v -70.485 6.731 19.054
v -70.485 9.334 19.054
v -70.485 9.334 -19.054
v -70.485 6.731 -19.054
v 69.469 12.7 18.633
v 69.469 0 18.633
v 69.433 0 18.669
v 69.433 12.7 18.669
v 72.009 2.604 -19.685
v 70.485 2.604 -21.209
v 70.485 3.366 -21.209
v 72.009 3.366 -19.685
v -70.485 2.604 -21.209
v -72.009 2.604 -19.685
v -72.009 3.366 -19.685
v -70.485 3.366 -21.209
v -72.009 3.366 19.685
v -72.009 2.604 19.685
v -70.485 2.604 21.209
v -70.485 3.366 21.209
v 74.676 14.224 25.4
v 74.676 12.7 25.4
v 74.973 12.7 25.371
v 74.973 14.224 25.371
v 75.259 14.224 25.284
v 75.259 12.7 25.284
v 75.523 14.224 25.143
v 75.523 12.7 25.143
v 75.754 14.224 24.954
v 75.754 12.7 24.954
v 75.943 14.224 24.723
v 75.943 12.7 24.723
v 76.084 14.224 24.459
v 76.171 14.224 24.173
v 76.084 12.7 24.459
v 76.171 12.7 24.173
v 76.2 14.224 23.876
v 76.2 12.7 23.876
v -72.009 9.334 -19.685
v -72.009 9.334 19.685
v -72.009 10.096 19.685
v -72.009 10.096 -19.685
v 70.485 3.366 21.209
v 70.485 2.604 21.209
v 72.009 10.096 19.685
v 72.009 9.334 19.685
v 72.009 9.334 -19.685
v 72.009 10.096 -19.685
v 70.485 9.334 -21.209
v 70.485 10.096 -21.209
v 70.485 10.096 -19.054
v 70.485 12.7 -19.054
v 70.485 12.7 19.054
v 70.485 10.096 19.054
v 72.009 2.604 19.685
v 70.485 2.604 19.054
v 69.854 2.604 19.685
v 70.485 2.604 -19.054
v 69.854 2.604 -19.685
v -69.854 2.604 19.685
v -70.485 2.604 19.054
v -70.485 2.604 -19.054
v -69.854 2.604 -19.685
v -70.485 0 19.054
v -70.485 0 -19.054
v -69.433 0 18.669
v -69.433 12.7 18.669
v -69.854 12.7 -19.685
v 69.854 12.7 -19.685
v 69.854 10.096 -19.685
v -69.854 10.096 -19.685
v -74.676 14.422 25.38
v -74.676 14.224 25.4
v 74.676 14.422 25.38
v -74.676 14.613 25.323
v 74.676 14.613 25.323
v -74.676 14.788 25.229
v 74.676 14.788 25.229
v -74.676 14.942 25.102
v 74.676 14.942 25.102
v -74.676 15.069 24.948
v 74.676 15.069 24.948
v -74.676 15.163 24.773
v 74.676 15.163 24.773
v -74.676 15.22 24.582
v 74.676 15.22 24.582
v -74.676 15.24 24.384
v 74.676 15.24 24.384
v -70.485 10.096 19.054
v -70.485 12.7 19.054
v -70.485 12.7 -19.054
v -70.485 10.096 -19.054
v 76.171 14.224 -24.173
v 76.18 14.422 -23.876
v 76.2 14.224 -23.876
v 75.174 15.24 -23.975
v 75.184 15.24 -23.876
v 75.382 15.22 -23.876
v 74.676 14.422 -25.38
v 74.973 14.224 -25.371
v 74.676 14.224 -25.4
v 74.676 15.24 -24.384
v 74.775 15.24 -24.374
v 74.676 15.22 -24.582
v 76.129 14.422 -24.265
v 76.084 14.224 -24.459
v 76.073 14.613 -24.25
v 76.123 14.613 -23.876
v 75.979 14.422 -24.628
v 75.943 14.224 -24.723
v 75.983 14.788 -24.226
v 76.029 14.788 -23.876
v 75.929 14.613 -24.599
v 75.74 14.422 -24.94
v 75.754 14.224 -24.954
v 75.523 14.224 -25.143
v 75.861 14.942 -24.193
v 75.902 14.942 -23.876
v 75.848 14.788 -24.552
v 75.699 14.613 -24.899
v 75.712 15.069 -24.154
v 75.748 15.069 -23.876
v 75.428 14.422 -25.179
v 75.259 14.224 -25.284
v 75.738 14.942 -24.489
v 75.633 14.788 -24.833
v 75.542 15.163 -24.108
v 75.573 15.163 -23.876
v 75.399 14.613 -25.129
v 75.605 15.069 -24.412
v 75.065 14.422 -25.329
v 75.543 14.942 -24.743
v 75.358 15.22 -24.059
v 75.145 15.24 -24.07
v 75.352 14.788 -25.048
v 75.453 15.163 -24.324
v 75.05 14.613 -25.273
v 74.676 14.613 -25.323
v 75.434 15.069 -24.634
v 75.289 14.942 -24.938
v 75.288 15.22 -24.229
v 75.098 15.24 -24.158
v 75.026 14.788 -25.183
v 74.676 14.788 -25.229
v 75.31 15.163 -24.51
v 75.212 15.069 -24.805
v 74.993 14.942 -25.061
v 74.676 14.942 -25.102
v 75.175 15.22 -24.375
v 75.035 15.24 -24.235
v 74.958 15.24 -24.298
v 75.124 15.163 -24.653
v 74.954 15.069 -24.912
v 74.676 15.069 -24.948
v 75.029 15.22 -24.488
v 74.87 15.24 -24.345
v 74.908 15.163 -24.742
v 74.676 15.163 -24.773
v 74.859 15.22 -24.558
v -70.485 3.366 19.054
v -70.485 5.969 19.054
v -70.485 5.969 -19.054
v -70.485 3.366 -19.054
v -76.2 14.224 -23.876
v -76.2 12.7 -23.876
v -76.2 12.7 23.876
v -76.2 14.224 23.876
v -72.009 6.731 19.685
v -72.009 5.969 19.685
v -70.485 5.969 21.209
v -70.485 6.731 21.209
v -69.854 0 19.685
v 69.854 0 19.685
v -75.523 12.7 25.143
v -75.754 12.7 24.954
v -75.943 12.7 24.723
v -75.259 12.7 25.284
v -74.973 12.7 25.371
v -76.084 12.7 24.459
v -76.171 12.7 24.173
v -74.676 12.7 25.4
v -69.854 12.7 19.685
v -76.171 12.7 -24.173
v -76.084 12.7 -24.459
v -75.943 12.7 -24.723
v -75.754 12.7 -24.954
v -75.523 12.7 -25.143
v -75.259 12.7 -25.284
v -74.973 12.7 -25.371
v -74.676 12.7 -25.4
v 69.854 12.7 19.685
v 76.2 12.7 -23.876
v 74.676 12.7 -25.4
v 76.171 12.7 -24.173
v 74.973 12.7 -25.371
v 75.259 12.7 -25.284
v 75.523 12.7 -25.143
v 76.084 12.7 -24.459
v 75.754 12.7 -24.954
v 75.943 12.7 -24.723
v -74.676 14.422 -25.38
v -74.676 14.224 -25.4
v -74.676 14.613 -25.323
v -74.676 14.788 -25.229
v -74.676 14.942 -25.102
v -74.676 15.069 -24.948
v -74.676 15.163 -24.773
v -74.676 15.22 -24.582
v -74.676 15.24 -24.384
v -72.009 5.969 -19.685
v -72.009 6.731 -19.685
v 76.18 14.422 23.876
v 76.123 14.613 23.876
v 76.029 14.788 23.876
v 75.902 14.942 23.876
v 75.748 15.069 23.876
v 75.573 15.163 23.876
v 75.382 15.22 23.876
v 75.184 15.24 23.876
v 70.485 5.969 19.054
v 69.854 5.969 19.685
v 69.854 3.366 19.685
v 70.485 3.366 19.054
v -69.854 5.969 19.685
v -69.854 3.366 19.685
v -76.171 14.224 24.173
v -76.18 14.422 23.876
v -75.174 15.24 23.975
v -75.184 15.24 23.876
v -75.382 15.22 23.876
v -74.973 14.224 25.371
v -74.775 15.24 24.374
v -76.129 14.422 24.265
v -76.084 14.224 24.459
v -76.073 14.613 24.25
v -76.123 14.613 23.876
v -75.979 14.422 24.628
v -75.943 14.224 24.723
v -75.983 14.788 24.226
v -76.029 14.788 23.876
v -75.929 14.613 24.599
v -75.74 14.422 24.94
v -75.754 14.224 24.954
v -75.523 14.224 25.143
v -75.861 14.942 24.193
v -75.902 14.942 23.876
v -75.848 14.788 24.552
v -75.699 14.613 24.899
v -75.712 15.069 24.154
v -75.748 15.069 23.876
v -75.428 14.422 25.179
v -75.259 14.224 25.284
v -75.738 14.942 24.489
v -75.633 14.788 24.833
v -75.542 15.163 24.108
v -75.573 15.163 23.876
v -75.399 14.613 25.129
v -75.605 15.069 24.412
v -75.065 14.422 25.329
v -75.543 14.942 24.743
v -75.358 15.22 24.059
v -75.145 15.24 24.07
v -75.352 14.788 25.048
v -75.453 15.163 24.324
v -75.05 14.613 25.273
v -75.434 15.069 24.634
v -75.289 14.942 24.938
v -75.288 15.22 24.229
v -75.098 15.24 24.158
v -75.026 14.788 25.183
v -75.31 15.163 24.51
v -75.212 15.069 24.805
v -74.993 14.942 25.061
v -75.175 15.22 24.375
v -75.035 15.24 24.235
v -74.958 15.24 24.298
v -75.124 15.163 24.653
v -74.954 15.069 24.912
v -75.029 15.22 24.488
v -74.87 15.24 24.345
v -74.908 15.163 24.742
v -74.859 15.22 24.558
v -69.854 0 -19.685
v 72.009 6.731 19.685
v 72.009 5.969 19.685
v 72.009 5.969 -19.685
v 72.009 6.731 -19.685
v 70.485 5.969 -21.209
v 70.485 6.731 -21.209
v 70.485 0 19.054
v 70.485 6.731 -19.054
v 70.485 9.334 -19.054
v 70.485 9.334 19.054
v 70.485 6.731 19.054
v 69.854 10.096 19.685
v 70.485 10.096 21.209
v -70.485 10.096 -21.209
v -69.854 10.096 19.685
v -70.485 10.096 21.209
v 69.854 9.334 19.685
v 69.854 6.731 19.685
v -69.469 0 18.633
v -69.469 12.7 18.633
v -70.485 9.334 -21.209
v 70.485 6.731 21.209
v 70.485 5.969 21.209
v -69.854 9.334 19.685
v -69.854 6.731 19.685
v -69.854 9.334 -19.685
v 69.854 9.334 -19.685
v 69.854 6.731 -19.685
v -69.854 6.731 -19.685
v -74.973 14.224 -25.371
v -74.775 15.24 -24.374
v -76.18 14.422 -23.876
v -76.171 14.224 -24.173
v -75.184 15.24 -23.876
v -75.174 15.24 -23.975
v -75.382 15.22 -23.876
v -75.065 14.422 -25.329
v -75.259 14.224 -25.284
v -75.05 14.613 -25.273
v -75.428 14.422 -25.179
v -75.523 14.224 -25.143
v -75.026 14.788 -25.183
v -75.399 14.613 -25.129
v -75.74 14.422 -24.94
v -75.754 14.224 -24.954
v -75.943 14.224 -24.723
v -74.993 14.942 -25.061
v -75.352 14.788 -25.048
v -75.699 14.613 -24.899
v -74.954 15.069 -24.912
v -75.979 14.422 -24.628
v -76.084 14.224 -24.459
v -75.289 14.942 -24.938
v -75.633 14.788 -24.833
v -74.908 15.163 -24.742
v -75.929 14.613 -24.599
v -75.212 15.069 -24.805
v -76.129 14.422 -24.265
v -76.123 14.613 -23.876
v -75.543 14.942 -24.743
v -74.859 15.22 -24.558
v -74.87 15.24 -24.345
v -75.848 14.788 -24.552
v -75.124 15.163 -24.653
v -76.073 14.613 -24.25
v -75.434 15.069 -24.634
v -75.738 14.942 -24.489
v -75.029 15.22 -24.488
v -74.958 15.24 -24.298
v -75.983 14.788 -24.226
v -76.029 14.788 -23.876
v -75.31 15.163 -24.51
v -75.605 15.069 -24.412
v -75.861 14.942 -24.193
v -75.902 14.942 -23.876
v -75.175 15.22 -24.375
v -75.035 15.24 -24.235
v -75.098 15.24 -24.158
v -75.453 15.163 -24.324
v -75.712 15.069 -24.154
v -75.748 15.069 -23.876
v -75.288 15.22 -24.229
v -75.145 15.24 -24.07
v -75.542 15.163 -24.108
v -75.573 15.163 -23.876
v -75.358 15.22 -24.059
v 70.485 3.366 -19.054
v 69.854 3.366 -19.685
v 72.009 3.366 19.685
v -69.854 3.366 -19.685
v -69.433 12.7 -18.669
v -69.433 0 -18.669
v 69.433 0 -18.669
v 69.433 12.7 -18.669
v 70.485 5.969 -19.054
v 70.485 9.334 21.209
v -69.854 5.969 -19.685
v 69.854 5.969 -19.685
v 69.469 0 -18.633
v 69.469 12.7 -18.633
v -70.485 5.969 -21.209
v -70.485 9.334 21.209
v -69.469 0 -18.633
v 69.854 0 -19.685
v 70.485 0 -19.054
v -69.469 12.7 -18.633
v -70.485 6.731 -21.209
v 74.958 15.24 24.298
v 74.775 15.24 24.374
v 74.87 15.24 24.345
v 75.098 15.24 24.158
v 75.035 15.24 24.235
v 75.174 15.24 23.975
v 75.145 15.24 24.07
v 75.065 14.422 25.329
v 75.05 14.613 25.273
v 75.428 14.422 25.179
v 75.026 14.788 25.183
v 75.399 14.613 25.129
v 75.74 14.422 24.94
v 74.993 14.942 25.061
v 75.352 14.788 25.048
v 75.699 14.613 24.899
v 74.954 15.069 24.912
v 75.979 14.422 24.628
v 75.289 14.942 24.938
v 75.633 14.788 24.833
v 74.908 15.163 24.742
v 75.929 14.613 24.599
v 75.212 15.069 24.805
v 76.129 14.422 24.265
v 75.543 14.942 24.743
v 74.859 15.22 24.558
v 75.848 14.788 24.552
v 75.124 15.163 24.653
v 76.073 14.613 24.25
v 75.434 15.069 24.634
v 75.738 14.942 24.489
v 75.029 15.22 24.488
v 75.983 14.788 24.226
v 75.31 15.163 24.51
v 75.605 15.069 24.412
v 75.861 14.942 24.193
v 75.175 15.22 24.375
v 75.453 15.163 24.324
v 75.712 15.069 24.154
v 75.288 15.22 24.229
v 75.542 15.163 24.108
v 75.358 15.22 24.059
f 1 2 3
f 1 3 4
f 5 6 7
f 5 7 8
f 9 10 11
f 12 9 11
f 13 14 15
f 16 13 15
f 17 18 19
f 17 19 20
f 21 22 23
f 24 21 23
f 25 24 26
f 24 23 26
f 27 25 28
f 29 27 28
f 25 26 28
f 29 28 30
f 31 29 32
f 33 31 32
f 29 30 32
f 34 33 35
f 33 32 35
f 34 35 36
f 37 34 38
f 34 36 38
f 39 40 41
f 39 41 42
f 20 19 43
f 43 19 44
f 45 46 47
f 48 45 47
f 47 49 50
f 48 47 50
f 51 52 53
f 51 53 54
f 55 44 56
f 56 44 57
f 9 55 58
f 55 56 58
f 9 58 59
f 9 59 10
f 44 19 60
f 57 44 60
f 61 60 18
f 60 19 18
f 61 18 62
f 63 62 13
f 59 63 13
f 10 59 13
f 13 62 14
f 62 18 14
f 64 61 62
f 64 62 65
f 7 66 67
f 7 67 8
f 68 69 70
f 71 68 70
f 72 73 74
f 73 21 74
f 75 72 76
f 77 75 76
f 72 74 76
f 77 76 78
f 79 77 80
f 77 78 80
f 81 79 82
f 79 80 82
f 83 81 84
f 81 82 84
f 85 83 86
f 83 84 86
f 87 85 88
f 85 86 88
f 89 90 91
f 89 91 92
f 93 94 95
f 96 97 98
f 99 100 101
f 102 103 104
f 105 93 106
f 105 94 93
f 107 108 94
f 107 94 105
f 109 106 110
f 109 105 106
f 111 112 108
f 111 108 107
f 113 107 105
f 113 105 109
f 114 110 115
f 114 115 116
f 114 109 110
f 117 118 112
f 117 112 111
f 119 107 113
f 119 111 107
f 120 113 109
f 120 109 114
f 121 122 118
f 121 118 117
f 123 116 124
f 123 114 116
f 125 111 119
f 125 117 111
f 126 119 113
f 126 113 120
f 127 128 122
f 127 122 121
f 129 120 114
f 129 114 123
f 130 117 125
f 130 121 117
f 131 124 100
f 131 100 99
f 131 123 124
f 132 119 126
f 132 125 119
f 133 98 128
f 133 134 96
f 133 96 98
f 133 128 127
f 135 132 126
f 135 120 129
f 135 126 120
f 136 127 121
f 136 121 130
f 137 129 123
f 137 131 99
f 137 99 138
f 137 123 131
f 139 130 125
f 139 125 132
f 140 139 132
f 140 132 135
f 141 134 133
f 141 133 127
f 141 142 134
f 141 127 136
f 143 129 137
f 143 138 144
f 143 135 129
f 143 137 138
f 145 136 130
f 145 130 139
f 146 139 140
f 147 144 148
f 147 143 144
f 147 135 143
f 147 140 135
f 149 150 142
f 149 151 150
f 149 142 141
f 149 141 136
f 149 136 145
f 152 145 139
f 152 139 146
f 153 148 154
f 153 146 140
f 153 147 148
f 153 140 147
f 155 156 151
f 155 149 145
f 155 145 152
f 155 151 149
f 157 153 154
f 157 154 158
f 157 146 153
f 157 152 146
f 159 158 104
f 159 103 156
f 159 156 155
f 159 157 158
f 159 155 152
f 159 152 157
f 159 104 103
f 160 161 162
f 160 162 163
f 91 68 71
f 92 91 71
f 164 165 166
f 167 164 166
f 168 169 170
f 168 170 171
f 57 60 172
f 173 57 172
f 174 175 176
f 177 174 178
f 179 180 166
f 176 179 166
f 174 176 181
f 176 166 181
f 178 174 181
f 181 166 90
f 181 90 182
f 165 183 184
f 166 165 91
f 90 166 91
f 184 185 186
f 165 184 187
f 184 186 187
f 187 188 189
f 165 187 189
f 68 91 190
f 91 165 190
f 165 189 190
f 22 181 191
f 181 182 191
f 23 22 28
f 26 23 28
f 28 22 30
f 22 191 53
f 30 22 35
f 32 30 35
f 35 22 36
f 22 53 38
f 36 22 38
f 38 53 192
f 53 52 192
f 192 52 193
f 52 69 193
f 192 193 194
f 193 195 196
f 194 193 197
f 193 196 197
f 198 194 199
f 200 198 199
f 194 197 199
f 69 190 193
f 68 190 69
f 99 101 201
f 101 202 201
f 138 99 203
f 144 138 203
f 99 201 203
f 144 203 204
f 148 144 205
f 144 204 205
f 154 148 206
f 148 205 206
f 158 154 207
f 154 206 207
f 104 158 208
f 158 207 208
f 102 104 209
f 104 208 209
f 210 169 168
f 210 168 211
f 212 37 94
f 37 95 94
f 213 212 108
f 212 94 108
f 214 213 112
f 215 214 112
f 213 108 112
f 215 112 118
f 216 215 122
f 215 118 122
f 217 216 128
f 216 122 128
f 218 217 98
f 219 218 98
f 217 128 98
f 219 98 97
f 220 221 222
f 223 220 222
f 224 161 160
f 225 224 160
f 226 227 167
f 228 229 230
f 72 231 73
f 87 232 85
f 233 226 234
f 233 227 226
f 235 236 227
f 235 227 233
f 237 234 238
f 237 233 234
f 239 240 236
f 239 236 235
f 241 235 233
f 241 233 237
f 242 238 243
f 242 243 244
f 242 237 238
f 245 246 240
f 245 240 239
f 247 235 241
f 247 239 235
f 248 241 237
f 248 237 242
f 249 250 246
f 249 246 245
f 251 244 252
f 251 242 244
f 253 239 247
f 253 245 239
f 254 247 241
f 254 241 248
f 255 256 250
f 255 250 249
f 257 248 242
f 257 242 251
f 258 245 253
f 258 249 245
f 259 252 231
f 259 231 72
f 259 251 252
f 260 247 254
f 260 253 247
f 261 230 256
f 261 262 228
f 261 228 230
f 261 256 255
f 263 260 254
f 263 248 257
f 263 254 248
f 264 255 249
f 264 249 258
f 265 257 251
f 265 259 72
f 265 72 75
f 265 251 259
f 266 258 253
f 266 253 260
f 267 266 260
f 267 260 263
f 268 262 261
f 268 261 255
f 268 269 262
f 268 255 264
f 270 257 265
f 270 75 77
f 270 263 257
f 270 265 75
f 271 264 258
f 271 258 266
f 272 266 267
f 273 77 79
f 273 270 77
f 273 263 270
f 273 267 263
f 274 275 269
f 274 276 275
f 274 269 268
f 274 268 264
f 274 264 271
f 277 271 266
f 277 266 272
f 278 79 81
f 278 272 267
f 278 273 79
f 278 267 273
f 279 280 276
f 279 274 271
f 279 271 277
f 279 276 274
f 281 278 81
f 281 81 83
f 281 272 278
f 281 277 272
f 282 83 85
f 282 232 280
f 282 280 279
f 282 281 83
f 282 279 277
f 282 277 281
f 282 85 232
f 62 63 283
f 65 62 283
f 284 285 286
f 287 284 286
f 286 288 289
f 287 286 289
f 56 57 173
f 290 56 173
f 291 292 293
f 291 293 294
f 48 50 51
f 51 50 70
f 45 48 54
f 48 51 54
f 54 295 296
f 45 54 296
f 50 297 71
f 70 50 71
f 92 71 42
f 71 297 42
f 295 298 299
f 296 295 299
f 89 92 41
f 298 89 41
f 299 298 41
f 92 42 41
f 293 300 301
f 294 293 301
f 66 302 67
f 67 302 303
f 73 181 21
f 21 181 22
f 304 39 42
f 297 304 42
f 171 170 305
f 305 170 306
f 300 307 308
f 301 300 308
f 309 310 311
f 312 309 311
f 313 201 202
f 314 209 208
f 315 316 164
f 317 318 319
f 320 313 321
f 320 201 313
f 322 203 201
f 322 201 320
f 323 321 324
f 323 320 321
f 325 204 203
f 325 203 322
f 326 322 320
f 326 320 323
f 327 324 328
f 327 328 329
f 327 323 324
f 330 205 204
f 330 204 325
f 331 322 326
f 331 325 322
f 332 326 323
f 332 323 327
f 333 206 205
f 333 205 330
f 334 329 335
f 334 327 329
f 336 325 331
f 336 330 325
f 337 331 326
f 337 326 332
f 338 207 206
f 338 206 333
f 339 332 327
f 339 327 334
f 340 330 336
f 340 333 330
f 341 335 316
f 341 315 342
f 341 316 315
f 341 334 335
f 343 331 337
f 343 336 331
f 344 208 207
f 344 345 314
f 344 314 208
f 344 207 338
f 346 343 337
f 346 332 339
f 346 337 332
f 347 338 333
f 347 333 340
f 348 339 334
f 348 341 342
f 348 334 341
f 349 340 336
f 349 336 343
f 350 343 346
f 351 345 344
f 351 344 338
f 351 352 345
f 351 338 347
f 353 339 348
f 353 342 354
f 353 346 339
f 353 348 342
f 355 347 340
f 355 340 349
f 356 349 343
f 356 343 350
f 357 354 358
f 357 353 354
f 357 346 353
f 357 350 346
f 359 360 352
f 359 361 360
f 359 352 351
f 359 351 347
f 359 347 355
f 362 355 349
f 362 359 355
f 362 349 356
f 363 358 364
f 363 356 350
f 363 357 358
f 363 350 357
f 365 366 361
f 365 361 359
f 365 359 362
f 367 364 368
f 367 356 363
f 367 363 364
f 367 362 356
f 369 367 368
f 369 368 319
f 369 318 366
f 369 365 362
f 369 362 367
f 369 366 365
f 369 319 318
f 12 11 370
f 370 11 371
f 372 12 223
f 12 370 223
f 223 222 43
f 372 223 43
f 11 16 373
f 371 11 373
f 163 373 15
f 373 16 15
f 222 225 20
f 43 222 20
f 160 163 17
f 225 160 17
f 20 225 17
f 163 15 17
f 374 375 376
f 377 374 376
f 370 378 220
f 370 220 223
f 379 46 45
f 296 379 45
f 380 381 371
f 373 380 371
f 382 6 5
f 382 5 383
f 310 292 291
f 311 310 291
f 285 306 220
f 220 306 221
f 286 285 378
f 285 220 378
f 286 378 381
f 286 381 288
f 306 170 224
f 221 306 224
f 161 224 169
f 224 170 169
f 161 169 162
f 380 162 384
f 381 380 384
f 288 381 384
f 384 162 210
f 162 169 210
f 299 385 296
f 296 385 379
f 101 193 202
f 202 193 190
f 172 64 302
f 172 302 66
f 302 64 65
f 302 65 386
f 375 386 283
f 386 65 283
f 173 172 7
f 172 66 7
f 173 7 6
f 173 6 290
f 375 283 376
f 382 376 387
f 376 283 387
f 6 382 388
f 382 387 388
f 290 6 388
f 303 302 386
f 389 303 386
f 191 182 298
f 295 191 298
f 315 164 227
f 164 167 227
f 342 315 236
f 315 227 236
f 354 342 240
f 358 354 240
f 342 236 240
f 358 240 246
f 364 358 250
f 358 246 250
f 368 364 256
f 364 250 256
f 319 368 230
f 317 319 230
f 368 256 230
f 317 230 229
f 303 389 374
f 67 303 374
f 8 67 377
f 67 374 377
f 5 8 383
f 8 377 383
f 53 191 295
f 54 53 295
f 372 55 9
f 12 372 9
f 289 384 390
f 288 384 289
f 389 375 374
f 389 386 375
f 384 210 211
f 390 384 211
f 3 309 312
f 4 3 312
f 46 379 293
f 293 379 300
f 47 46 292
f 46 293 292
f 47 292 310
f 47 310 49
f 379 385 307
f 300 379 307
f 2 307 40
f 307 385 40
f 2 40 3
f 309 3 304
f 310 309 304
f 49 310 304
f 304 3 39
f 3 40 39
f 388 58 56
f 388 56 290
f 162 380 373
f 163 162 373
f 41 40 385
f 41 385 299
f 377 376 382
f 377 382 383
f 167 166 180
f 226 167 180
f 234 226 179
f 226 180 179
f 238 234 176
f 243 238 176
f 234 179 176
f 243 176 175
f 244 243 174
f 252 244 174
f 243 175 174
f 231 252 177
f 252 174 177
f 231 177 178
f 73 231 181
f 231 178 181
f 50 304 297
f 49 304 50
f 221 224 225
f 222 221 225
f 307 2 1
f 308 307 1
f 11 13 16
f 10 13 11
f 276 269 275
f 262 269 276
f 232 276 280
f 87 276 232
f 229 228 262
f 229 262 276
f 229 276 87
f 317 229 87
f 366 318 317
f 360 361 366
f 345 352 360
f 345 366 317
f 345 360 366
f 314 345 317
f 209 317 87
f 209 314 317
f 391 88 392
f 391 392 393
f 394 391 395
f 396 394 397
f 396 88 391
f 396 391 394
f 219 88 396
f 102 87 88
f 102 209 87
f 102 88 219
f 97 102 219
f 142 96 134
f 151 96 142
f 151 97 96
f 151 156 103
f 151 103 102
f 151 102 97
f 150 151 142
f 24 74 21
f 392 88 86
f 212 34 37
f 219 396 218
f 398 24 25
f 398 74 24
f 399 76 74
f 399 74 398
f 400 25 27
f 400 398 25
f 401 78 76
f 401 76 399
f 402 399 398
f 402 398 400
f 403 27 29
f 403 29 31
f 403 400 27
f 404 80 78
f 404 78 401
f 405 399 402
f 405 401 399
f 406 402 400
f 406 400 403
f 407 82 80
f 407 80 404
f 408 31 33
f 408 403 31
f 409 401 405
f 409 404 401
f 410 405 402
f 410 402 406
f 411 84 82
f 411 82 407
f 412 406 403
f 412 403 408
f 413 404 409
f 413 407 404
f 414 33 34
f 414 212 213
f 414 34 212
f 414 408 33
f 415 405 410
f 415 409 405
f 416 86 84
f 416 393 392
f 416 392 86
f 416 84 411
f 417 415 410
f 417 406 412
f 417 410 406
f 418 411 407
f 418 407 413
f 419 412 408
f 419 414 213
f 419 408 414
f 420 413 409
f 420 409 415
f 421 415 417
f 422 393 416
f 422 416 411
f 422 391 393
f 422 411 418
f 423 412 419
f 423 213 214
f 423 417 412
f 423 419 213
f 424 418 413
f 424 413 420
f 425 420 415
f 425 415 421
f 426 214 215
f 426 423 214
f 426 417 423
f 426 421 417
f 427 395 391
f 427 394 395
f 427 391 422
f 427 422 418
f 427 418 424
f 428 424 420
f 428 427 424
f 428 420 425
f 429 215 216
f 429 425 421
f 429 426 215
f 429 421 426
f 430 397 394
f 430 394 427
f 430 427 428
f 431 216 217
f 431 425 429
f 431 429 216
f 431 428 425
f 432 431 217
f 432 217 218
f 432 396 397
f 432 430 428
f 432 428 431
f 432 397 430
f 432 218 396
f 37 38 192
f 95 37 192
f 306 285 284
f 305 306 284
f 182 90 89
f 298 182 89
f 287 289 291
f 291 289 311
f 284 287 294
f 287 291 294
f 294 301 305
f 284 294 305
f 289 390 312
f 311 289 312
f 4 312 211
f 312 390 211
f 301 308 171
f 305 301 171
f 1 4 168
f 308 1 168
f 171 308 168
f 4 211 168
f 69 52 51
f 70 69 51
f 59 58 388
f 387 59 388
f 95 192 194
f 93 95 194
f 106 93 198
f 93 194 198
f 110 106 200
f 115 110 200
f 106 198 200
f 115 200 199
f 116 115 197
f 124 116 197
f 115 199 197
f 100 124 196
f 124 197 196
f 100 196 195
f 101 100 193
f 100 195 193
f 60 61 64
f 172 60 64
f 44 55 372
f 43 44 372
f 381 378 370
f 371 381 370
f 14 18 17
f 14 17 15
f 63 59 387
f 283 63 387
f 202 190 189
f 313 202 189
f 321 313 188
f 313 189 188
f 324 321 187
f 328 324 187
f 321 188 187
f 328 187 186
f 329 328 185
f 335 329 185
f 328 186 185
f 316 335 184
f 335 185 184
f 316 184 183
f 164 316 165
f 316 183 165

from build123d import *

# Parameters (mm, degrees)
SKETCH1_W           = 144.018
SKETCH1_H           = 42.418
BOSS_EXTRUDE1_DEPTH = 12.7
BOSS_EXTRUDE2_DEPTH = 2.54
CHAMFER1_SIZE       = 1.524
SHELL1_T            = -2.54
SKETCH4_W           = 1.524
SKETCH4_H           = 2.6035
FILLET2_R           = 1.016


with BuildPart() as part:
    # Sketch1 → Boss-Extrude1 (new body)
    with BuildSketch(Plane(origin=(0, 0, 0), x_dir=(1, 0, 0), z_dir=(0, 1, 0))):
        Rectangle(SKETCH1_W, SKETCH1_H)
    extrude(amount=BOSS_EXTRUDE1_DEPTH)

    # Sketch2 → Boss-Extrude2 (add)
    with BuildSketch(Plane(origin=(0, 12.7, 0), x_dir=(1, 0, 0), z_dir=(0, 1, 0))):
        with BuildLine():
            Line((-76.2, 23.876), (-76.2, -23.876))
            ThreePointArc((-76.2, -23.876), (-75.753630735, -24.953630735), (-74.676, -25.4))
            Line((-74.676, -25.4), (74.676, -25.4))
            ThreePointArc((74.676, -25.4), (75.753630735, -24.953630735), (76.2, -23.876))
            Line((76.2, -23.876), (76.2, 23.876))
            ThreePointArc((76.2, 23.876), (75.753630735, 24.953630735), (74.676, 25.4))
            Line((74.676, 25.4), (-74.676, 25.4))
            ThreePointArc((-74.676, 25.4), (-75.753630735, 24.953630735), (-76.2, 23.876))
        make_face()
    extrude(amount=BOSS_EXTRUDE2_DEPTH)

    # Chamfer1
    chamfer1_edges = [part.edges().sort_by_distance(p)[0] for p in [
        (72.009, 6.35, 21.209),
        (-72.009, 6.35, 21.209),
        (-72.009, 6.35, -21.209),
        (72.009, 6.35, -21.209),
    ]]
    chamfer(chamfer1_edges, length=CHAMFER1_SIZE)

    # Shell1
    shell1_openings = [part.faces().sort_by_distance(p)[0] for p in [
        (0, 0, 0),
    ]]
    offset(amount=SHELL1_T, openings=shell1_openings, kind=Kind.INTERSECTION)

    # Cut-Sweep2: sweep along a path in Sketch3
    with BuildLine(Plane(origin=(0, 0, 0), x_dir=(-1, 0, 0), z_dir=(0, -1, 0))) as cut_sweep2_path:
        Line((-72.009, 19.685), (-72.009, -19.685))
        Line((-72.009, -19.685), (-70.485, -21.209))
        Line((-70.485, -21.209), (70.485, -21.209))
        Line((70.485, -21.209), (72.009, -19.685))
        Line((72.009, -19.685), (72.009, 19.685))
        Line((72.009, 19.685), (70.485, 21.209))
        Line((70.485, 21.209), (-70.485, 21.209))
        Line((-70.485, 21.209), (-72.009, 19.685))
    # Sketch4 → Cut-Sweep2 (sweep, cut)
    with BuildSketch(Plane.XY):
        with Locations((71.247, 1.30175)):
            Rectangle(SKETCH4_W, SKETCH4_H)
        with Locations((71.247, 8.03275)):
            Rectangle(SKETCH4_W, SKETCH4_H)
        with Locations((71.247, 11.39825)):
            Rectangle(SKETCH4_W, SKETCH4_H)
        with Locations((71.247, 4.66725)):
            Rectangle(SKETCH4_W, SKETCH4_H)
    sweep(path=cut_sweep2_path.line, transition=Transition.RIGHT, mode=Mode.SUBTRACT)

    # Fillet2
    fillet2_edges = [part.edges().sort_by_distance(p)[0] for p in [
        (-75.753630735, 15.24, 24.953630735),
        (0, 15.24, 25.4),
        (75.753630735, 15.24, 24.953630735),
        (76.2, 15.24, 0),
        (75.753630735, 15.24, -24.953630735),
        (0, 15.24, -25.4),
        (-75.753630735, 15.24, -24.953630735),
        (-76.2, 15.24, 0),
    ]]
    fillet(fillet2_edges, radius=FILLET2_R)


solid = part.part
